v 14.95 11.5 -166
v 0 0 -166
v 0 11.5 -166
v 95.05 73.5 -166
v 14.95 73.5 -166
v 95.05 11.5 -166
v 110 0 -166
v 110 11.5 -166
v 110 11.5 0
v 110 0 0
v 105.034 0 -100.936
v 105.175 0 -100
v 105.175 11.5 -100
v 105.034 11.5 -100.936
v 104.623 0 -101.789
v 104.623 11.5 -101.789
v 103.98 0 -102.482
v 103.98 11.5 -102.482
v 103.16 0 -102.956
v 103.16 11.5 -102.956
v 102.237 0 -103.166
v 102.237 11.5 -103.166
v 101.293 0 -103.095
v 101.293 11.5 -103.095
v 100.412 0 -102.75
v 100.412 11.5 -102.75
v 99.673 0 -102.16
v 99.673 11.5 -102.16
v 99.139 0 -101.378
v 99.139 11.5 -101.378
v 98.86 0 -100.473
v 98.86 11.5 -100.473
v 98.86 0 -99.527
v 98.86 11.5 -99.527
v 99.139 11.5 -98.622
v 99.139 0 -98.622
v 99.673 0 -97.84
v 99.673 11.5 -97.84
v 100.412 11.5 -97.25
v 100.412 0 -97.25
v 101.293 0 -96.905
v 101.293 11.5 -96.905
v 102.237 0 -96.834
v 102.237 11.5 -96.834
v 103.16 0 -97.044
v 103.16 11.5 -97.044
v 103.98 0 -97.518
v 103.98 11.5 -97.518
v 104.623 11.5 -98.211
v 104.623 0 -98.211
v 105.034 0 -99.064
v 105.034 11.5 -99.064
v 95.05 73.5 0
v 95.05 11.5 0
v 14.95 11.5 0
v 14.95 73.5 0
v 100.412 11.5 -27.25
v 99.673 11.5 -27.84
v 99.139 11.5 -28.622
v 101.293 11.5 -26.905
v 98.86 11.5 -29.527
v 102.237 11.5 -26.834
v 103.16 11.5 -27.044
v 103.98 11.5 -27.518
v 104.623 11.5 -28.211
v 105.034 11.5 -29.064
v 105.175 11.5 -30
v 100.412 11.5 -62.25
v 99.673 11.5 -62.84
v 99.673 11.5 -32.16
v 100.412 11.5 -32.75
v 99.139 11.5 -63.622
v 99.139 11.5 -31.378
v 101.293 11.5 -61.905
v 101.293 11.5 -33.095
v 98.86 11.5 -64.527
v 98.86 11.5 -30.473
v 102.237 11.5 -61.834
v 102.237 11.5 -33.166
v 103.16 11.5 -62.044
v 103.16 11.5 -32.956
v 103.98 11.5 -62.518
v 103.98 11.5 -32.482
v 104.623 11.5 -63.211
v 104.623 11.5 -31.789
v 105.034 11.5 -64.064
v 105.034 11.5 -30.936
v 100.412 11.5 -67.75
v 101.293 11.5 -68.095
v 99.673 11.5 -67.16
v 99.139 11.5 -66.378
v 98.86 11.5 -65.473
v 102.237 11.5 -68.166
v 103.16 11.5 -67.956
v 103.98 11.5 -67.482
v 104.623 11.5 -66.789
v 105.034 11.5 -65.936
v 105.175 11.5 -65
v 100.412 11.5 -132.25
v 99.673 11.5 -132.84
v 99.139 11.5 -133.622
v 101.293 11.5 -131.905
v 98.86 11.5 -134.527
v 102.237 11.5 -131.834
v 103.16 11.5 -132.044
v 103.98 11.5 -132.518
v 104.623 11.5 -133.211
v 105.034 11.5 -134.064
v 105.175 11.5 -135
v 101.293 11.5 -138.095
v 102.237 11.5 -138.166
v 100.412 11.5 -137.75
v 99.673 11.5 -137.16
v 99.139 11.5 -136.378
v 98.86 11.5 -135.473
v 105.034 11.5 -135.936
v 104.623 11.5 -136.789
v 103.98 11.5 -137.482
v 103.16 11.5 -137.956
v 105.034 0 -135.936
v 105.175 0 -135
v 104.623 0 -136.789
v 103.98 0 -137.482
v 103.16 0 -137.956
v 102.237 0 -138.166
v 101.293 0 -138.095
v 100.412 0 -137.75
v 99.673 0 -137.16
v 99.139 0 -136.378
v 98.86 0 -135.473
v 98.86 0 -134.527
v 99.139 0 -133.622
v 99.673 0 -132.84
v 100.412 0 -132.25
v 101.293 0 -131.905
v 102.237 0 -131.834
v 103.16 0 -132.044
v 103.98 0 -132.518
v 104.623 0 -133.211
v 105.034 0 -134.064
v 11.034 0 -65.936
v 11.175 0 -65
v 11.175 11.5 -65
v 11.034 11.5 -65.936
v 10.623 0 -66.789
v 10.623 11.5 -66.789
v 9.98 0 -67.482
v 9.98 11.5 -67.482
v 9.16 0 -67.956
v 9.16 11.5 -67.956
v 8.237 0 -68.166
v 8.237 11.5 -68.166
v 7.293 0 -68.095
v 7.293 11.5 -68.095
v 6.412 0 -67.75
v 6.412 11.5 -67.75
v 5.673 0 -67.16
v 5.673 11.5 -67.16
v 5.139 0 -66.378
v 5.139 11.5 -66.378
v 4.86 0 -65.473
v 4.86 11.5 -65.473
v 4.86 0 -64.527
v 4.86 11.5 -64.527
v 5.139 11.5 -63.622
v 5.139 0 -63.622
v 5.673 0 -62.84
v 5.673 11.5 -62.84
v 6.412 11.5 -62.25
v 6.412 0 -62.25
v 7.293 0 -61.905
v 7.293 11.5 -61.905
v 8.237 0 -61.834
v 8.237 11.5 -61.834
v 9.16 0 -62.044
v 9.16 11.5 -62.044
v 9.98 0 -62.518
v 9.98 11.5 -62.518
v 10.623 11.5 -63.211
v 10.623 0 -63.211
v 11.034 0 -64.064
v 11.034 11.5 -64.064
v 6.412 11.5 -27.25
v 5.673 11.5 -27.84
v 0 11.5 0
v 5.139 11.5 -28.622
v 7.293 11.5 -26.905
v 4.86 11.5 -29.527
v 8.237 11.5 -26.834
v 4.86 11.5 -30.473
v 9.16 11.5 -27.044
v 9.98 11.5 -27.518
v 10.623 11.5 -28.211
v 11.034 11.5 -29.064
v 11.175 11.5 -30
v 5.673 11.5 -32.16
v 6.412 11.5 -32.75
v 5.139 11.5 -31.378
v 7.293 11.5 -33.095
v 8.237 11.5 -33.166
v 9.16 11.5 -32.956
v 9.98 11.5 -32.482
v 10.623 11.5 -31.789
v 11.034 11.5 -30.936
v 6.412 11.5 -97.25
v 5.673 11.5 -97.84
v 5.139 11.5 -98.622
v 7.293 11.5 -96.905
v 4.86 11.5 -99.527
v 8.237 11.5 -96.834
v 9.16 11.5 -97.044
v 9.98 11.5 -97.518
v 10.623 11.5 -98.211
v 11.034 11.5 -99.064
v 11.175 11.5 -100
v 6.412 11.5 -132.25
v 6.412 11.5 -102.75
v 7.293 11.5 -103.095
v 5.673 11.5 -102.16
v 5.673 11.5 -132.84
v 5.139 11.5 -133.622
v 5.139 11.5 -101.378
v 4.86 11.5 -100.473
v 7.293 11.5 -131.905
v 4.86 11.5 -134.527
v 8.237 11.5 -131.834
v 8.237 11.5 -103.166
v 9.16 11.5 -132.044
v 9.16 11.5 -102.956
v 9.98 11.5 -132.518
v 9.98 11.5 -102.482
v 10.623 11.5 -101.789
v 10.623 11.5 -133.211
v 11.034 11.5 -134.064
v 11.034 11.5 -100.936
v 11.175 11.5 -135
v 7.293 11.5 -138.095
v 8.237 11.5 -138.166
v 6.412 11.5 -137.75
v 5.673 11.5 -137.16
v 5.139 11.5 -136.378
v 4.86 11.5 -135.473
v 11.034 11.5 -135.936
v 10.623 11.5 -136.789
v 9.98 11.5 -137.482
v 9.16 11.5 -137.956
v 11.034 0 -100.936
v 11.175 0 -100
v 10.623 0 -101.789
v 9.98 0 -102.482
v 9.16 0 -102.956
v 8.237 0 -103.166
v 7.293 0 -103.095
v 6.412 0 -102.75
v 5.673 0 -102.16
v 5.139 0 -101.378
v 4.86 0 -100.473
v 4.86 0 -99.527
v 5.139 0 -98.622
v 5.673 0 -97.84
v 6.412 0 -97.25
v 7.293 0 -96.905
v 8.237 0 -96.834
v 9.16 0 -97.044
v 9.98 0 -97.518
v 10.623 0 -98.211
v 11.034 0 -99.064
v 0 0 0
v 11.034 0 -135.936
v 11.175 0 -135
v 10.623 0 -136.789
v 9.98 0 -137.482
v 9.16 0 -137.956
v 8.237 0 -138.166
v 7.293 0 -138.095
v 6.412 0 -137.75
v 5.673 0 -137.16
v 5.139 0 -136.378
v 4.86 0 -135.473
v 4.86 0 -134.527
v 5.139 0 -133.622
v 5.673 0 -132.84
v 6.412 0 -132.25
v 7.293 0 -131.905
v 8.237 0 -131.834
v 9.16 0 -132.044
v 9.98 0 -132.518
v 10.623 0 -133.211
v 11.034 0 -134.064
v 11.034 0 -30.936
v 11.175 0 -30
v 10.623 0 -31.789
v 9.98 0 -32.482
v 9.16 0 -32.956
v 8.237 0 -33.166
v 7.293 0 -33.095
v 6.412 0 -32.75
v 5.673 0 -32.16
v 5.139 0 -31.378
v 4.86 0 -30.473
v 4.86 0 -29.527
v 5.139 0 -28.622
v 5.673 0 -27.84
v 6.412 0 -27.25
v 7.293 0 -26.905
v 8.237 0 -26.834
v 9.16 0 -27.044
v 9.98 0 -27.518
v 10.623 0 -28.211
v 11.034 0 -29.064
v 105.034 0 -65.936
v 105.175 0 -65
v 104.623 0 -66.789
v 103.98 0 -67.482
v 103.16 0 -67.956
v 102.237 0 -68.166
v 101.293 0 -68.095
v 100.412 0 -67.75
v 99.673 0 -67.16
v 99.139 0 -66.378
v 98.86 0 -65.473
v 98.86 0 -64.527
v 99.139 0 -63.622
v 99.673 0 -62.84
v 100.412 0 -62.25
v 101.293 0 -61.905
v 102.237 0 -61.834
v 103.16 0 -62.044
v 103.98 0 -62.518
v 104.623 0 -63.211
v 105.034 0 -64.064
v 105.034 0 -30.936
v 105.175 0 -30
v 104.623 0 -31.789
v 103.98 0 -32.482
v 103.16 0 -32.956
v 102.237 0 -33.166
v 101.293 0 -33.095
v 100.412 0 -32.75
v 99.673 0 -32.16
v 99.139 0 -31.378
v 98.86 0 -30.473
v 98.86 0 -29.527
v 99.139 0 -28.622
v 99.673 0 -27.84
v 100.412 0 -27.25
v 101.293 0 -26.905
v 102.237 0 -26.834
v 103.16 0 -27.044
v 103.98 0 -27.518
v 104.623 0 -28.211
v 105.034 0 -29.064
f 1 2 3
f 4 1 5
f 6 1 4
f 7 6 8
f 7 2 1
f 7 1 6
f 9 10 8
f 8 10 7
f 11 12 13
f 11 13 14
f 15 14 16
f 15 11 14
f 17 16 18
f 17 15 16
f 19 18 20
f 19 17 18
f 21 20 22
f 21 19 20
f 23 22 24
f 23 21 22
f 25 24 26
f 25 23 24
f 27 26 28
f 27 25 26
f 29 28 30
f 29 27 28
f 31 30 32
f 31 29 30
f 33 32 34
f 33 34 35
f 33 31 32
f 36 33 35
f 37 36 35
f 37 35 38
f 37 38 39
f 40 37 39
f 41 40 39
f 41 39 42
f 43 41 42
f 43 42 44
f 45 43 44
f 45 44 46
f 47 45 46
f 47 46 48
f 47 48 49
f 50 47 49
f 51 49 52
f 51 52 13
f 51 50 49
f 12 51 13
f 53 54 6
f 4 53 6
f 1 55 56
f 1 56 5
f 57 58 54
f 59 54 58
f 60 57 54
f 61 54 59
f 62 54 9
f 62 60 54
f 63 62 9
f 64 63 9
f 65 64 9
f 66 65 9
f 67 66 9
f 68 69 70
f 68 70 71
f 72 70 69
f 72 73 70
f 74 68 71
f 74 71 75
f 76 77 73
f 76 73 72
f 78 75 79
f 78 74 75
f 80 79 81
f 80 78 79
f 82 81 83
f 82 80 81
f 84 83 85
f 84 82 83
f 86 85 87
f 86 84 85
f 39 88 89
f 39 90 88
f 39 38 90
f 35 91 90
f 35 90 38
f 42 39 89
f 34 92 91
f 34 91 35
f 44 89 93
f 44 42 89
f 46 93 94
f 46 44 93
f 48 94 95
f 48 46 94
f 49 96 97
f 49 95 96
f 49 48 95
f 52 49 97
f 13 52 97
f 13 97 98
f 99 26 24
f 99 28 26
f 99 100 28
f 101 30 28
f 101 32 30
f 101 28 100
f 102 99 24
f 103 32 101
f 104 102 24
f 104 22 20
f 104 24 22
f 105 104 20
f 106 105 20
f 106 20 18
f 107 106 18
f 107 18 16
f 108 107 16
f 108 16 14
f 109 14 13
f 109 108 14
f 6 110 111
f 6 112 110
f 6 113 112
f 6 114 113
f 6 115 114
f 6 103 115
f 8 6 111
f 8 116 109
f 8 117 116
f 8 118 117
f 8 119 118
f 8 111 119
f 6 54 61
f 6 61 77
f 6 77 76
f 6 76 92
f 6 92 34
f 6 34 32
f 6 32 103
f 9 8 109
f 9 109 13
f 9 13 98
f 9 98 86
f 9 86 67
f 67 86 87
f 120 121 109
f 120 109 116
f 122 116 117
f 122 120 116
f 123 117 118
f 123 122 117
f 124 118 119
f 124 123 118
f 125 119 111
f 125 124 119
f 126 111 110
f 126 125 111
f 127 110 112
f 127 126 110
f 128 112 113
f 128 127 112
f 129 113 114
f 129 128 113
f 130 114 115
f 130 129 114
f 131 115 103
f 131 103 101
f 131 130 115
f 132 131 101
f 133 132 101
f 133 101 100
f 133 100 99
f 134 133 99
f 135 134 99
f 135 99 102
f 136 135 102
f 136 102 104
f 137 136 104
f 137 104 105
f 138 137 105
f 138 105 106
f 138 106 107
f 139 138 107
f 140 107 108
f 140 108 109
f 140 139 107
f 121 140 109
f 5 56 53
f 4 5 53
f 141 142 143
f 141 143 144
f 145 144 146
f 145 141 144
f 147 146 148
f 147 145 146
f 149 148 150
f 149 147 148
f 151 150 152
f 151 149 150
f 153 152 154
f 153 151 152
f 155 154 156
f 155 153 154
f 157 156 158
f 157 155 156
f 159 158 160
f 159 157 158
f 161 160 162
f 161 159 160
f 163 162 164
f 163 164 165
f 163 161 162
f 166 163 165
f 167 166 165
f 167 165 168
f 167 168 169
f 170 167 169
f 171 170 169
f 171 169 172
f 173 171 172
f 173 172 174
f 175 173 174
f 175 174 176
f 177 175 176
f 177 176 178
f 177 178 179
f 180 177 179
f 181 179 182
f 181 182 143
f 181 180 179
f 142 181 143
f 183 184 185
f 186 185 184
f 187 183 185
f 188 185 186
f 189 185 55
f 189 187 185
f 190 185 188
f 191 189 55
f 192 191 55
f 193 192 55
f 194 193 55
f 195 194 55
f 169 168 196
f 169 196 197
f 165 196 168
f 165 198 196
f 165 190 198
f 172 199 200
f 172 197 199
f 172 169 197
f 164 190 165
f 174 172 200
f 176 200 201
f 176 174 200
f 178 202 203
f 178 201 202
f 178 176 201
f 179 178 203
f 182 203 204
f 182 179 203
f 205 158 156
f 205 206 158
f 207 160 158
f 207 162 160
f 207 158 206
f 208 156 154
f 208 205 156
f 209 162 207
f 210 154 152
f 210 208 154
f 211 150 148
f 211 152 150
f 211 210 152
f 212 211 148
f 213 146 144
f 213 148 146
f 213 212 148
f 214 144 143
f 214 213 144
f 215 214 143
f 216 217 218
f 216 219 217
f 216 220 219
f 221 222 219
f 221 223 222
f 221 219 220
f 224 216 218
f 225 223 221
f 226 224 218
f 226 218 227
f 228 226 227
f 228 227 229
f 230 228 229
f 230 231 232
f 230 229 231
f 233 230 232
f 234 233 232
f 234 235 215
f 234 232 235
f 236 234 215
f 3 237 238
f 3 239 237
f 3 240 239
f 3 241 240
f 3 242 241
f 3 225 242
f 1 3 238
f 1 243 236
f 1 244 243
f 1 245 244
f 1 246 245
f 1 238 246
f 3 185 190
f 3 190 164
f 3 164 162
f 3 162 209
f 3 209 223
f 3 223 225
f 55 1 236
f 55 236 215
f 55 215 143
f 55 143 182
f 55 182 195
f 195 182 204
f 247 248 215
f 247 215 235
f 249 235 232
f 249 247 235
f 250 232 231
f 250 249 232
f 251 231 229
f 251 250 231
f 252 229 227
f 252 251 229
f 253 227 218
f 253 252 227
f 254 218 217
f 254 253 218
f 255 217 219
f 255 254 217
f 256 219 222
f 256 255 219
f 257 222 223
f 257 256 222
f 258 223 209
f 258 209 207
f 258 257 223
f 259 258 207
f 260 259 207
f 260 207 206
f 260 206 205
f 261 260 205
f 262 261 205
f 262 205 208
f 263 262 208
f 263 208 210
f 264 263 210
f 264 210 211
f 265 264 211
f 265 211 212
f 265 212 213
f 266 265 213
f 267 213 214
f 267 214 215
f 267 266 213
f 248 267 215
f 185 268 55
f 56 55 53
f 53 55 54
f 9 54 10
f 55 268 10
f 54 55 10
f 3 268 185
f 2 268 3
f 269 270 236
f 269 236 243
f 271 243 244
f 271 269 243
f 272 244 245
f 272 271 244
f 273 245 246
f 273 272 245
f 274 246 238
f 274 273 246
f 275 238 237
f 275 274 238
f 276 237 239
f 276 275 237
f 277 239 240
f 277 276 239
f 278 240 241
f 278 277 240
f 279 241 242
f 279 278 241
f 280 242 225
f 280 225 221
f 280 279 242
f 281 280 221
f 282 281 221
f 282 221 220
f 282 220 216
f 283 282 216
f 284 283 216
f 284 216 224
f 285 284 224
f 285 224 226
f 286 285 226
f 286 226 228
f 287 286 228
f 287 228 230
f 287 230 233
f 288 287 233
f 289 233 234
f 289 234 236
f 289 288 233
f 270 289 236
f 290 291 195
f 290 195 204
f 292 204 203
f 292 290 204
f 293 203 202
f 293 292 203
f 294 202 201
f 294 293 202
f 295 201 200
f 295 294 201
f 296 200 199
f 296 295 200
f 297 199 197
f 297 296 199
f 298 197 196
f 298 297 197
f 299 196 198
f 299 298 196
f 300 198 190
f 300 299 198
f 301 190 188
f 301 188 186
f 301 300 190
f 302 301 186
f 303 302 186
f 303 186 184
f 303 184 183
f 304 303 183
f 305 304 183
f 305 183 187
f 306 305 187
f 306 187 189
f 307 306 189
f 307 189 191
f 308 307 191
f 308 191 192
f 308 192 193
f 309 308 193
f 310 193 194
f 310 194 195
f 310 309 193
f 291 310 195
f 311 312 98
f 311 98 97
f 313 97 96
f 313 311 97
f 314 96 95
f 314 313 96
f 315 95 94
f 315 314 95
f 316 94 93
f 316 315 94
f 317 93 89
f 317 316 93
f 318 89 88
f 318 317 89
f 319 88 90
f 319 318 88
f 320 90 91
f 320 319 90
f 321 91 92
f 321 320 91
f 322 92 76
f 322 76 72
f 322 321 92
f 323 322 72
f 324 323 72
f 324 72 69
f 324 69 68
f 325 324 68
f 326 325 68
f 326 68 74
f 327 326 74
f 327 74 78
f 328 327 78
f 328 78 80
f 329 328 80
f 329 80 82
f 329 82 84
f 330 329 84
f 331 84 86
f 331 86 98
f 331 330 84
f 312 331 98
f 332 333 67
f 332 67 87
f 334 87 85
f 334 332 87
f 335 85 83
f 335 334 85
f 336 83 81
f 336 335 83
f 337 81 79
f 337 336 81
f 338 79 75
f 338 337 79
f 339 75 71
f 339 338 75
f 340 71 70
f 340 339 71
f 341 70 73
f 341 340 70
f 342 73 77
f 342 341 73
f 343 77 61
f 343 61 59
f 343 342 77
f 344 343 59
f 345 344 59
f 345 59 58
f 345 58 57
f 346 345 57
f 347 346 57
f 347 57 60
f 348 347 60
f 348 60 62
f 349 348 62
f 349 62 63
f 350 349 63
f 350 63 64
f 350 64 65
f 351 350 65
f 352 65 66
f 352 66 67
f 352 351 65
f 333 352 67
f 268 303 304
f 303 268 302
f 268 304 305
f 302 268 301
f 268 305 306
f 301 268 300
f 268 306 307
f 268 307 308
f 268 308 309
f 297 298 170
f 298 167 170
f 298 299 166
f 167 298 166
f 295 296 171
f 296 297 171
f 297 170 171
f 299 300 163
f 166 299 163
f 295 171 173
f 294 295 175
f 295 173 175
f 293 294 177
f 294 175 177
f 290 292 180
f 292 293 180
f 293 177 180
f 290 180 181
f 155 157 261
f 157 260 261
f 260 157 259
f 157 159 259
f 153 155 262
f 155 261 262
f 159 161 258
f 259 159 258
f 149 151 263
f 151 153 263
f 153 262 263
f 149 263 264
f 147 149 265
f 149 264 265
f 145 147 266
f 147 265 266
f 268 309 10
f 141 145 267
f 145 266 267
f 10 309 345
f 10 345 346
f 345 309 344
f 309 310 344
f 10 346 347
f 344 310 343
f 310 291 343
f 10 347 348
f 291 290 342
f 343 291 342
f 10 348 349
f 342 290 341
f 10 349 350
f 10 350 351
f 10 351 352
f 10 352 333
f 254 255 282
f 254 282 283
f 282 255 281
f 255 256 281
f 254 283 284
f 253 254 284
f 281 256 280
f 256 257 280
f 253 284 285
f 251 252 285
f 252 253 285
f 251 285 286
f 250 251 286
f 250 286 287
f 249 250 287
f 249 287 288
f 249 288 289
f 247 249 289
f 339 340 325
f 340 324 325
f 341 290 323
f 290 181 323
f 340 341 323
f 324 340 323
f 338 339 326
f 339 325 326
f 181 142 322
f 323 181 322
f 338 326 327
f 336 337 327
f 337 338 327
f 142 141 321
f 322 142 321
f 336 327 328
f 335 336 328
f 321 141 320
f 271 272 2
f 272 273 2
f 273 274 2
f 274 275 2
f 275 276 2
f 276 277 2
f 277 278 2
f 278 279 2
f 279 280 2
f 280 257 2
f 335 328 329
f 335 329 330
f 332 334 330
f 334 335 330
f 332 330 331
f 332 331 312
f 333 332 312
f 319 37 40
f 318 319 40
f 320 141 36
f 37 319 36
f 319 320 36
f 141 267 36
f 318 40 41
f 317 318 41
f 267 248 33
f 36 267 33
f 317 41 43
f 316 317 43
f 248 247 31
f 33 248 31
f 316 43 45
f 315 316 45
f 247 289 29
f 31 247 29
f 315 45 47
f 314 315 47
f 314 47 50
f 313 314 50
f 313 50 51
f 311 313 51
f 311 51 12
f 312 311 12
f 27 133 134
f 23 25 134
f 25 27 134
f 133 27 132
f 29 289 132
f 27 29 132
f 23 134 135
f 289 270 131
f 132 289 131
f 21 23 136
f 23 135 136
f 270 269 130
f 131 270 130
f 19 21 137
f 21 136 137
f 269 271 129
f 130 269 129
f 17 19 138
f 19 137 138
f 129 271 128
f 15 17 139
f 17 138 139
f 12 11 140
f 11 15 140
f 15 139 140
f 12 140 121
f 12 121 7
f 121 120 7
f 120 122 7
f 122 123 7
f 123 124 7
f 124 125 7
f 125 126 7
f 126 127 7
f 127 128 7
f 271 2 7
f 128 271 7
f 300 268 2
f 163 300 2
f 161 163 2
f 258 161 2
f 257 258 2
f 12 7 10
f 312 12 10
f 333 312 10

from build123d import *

# Parameters (mm, degrees)
SKETCH1_W           = 110
SKETCH1_H           = 166
SKETCH1_R           = 3.175
BOSS_EXTRUDE1_DEPTH = 11.5
SKETCH2_W           = 80.1
SKETCH2_H           = 166
BOSS_EXTRUDE2_DEPTH = 62


with BuildPart() as part:
    # Sketch1 → Boss-Extrude1 (new body)
    with BuildSketch(Plane(origin=(0, 0, 0), x_dir=(1, 0, 0), z_dir=(0, 1, 0))):
        with Locations((55, 83)):
            Rectangle(SKETCH1_W, SKETCH1_H)
        with Locations((8, 135)):
            Circle(SKETCH1_R, mode=Mode.SUBTRACT)
        with Locations((102, 135)):
            Circle(SKETCH1_R, mode=Mode.SUBTRACT)
        with Locations((102, 100)):
            Circle(SKETCH1_R, mode=Mode.SUBTRACT)
        with Locations((102, 65)):
            Circle(SKETCH1_R, mode=Mode.SUBTRACT)
        with Locations((102, 30)):
            Circle(SKETCH1_R, mode=Mode.SUBTRACT)
        with Locations((8, 100)):
            Circle(SKETCH1_R, mode=Mode.SUBTRACT)
        with Locations((8, 65)):
            Circle(SKETCH1_R, mode=Mode.SUBTRACT)
        with Locations((8, 30)):
            Circle(SKETCH1_R, mode=Mode.SUBTRACT)
    extrude(amount=BOSS_EXTRUDE1_DEPTH)

    # Sketch2 → Boss-Extrude2 (add)
    with BuildSketch(Plane(origin=(0, 11.5, 0), x_dir=(1, 0, 0), z_dir=(0, 1, 0))):
        with Locations((55, 83)):
            Rectangle(SKETCH2_W, SKETCH2_H)
    extrude(amount=BOSS_EXTRUDE2_DEPTH)


solid = part.part
